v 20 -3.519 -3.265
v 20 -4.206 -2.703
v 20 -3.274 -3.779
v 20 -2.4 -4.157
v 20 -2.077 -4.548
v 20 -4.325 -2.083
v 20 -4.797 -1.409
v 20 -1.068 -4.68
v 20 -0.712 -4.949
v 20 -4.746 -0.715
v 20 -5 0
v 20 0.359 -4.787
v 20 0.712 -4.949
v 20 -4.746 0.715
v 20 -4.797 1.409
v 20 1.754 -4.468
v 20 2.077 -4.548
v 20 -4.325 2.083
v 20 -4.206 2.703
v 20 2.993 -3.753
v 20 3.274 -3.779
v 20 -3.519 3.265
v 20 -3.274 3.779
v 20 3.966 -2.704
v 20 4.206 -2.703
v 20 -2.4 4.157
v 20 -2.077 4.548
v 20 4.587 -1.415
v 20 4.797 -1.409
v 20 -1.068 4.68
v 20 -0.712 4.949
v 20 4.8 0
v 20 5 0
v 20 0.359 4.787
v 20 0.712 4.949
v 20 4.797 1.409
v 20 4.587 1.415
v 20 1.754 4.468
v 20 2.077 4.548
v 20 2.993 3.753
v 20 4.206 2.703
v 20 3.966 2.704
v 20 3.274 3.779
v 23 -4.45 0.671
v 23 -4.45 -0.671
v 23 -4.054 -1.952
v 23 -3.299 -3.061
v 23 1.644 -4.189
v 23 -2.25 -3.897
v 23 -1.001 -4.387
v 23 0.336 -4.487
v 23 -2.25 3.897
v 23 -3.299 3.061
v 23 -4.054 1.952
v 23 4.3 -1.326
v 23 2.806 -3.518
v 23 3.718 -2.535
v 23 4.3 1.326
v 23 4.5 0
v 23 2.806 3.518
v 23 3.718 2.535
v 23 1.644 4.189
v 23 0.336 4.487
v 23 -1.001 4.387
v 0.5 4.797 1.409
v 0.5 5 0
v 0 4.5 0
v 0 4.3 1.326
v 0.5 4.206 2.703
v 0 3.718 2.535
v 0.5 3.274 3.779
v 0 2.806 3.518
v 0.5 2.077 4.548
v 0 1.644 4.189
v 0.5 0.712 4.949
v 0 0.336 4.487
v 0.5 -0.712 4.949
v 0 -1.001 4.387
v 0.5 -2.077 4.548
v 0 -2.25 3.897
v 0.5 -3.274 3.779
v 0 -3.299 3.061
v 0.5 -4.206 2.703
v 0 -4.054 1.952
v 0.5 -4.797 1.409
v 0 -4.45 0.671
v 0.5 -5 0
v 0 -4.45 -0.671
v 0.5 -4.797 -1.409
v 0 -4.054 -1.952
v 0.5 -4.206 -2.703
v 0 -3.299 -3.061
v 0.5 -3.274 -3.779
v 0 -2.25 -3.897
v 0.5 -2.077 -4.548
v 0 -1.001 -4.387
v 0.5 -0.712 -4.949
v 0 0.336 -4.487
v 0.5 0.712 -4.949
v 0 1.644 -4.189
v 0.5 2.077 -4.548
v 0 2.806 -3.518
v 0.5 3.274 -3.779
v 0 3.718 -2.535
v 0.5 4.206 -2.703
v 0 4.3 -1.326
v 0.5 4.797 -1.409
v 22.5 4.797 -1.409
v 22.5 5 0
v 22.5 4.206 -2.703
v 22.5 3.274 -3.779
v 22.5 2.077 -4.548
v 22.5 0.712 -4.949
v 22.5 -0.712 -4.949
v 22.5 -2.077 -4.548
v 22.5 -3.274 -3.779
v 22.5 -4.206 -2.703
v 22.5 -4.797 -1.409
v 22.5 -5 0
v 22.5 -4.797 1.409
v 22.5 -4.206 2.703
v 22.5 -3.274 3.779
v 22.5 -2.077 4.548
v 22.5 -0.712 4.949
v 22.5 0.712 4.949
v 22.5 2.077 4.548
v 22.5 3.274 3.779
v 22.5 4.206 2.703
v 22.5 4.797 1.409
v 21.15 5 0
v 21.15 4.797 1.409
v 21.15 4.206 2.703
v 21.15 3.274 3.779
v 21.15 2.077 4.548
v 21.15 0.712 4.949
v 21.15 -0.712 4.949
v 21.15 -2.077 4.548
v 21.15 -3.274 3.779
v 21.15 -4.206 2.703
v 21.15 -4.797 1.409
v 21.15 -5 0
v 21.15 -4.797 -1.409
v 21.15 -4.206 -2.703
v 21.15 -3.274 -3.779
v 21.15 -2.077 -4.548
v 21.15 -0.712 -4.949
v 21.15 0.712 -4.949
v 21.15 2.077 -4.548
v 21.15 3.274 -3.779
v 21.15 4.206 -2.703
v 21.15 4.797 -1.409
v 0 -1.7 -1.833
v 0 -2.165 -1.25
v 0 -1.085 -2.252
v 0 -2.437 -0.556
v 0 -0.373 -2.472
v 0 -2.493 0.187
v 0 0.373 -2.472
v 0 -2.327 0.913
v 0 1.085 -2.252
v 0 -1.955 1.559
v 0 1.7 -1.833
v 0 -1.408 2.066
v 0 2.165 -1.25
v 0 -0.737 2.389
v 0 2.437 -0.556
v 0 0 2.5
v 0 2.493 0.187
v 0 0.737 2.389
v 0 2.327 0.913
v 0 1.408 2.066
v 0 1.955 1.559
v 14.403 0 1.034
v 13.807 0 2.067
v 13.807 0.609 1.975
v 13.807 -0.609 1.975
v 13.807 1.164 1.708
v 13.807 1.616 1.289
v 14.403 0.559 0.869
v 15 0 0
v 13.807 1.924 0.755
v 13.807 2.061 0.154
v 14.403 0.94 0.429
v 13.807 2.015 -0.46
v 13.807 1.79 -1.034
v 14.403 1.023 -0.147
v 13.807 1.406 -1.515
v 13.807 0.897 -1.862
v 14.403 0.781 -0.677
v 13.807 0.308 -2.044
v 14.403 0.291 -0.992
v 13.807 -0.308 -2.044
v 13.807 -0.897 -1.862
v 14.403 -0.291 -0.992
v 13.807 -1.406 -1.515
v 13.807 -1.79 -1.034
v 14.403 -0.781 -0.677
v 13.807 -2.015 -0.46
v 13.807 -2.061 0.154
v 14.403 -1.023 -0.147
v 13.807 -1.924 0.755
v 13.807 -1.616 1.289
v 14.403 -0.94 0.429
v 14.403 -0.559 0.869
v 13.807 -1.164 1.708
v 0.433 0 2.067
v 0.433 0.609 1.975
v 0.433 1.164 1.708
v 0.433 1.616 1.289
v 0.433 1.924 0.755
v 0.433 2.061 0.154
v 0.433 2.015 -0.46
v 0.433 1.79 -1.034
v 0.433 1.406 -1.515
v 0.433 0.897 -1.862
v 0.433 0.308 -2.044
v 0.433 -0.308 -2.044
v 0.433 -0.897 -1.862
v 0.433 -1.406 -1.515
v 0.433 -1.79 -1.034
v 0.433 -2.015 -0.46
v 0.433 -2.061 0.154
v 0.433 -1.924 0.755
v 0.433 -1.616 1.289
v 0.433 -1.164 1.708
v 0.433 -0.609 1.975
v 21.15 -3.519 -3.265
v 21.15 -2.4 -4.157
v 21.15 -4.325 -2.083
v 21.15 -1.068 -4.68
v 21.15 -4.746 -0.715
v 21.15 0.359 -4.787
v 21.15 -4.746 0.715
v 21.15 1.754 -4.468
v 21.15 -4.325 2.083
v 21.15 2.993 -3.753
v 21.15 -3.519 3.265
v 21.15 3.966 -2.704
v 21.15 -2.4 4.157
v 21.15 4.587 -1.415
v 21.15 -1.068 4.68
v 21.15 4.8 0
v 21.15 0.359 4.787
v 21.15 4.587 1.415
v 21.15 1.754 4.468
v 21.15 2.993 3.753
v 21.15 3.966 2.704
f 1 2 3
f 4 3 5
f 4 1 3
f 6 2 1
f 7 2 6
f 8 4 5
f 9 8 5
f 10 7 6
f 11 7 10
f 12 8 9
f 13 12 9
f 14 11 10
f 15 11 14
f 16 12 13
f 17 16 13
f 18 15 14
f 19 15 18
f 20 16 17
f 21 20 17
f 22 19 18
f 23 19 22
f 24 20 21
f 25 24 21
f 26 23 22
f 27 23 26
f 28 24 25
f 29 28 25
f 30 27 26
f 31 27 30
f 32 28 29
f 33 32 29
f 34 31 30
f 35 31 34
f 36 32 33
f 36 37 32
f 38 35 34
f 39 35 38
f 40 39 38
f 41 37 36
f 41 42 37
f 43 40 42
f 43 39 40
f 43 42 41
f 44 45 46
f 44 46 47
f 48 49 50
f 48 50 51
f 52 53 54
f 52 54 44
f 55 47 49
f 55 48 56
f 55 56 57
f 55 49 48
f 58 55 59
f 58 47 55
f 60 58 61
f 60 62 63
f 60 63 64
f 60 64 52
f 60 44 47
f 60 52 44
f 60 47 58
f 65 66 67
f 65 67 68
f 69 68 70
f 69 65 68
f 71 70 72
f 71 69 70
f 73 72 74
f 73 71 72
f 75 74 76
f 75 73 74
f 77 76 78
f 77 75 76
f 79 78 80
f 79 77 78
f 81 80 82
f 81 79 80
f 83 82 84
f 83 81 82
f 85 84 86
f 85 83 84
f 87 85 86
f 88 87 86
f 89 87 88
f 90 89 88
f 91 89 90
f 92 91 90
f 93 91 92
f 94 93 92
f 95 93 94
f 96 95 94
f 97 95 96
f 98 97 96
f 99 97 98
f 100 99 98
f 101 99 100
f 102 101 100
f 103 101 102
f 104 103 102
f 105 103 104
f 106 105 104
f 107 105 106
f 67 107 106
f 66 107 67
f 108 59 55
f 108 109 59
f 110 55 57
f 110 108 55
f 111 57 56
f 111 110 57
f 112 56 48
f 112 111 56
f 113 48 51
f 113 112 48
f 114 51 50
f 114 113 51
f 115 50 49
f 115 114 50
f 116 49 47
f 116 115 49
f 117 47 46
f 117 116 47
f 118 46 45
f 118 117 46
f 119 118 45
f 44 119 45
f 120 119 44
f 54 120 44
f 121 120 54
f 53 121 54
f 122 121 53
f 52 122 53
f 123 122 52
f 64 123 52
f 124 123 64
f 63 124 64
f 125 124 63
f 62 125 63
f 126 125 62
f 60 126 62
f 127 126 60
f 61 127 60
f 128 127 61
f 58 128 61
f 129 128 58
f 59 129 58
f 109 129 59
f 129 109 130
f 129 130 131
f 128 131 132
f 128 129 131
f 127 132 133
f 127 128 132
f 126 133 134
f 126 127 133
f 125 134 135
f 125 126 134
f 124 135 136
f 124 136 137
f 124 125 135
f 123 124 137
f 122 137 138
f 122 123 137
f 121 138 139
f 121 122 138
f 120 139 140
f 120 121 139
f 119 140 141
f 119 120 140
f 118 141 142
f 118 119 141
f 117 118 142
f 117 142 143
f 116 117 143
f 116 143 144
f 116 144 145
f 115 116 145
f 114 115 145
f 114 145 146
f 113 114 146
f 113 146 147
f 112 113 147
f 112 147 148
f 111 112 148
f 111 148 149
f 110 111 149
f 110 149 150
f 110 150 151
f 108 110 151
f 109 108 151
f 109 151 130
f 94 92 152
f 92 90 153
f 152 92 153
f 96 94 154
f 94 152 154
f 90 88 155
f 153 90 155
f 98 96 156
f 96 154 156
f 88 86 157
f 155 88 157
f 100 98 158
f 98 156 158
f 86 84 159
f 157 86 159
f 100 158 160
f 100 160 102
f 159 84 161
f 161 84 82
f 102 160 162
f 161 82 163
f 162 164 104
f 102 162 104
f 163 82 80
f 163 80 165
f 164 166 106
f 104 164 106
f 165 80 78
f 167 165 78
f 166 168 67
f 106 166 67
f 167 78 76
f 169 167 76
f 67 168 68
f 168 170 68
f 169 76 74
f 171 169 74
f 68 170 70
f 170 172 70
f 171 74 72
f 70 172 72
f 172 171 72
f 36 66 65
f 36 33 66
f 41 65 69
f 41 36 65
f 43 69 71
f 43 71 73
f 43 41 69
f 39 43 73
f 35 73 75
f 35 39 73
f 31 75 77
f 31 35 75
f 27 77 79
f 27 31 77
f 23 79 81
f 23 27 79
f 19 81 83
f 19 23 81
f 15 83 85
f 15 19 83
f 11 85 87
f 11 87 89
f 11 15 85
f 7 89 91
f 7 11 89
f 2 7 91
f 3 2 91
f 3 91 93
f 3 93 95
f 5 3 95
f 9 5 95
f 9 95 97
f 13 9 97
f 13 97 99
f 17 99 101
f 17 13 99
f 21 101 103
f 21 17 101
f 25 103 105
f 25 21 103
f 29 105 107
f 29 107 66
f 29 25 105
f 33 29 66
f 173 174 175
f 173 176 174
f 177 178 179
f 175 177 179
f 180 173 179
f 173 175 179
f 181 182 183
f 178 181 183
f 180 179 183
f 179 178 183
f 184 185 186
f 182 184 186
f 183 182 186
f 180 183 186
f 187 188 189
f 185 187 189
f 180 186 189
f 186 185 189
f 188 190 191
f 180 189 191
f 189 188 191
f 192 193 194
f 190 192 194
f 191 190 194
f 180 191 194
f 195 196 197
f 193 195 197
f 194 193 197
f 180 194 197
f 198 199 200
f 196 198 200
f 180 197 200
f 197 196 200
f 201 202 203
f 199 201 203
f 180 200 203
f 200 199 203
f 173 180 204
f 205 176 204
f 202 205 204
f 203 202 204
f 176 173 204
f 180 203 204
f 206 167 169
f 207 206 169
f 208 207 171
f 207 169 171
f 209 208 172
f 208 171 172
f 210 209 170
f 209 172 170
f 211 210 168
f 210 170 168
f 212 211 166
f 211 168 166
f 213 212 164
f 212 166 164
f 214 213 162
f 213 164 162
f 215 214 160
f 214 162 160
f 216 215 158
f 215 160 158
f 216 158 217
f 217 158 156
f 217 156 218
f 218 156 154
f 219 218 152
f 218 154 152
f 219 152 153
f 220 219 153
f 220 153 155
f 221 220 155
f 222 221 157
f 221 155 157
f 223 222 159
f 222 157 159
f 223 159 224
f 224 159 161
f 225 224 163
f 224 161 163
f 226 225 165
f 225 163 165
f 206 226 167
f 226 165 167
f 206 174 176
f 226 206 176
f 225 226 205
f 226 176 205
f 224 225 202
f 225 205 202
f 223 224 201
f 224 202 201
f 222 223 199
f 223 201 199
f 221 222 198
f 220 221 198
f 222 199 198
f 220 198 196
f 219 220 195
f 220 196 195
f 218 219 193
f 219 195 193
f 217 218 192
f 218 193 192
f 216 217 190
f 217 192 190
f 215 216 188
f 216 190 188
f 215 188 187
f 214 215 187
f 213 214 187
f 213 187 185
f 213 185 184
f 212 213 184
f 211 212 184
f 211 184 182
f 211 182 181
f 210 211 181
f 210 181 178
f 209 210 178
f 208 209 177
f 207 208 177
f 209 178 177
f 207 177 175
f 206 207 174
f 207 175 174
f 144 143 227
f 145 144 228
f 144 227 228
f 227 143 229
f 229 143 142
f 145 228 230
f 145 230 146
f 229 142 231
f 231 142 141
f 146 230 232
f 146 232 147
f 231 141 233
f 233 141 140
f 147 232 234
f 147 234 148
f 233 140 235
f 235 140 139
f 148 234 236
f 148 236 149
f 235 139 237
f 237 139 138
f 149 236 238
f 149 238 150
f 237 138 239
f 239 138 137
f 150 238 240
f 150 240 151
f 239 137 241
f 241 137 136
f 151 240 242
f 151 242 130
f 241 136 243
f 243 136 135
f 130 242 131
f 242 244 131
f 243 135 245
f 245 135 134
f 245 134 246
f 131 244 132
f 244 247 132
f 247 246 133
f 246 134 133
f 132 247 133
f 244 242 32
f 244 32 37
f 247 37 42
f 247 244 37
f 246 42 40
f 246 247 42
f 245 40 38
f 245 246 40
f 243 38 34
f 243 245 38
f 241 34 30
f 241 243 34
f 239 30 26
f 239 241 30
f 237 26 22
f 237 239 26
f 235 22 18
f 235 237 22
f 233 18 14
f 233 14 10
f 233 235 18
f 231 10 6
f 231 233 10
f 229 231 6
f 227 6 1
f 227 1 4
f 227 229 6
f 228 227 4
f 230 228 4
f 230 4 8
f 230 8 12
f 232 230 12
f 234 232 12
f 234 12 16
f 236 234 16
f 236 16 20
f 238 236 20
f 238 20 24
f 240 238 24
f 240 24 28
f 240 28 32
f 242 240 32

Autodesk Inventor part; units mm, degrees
sketch "Sketch_1" plane through (0, 0, 0) normal (0, 0, 1) x (1, 0, 0)
  line L0 (23, 0) -> (0, 0)
  line L1 (0, 0) -> (0, 4.5)
  line L2 (0, 4.5) -> (0.5, 5)
  line L3 (0.5, 5) -> (22.5, 5)
  line L4 (22.5, 5) -> (23, 4.5)
  line L5 (23, 4.5) -> (23, 0)
  line L6 (23, 0) -> (0, 0)
revolve "Revolution1" add sketch "Sketch_1" angle 360 about axis through (23, 0, 0) along (1, 0, 0)
sketch "Sketch2" plane through (0, 0, 0) normal (-1, 0, 0) x (0, 0, 1)
  point P0 (0, 0)
hole "Hole1" at (0, 0, 0) direction (1, 0, 0) diameter 4.134 depth 13.8066 tip angle 120 countersink diameter 5 countersink angle 90 thread size "M5x0.8" class "6H" standard "ISO Metric profile"
sketch "Sketch_20" plane through (0, 0, 0) normal (0, 0, 1) x (1, 0, 0)
  line L0 (23, 0) -> (-23, 0)
  line L1 (20, 9.6) -> (20, 4.8)
  line L2 (20, 4.8) -> (21.15, 4.8)
  line L3 (21.15, 4.8) -> (21.15, 9.6)
  line L4 (21.15, 9.6) -> (20, 9.6)
revolve "Revolution2" cut sketch "Sketch_20" angle 360 about axis through (23, 0, 0) along (1, 0, 0)
ref_plane "to_ring_F_R_XY" through (20.575, 0, 0) normal (1, 0, 0) x (0, 0, -1)
ref_plane "to_ring_F_R_YZ" through (20.575, 0, 0) normal (0, 0, -1) x (0, 1, 0)
ref_plane "to_ring_F_R_ZX" through (20.575, 0, 0) normal (0, 1, 0) x (1, 0, 0)
properties part number "SSFRBF-D10-L23-M5-U3"
